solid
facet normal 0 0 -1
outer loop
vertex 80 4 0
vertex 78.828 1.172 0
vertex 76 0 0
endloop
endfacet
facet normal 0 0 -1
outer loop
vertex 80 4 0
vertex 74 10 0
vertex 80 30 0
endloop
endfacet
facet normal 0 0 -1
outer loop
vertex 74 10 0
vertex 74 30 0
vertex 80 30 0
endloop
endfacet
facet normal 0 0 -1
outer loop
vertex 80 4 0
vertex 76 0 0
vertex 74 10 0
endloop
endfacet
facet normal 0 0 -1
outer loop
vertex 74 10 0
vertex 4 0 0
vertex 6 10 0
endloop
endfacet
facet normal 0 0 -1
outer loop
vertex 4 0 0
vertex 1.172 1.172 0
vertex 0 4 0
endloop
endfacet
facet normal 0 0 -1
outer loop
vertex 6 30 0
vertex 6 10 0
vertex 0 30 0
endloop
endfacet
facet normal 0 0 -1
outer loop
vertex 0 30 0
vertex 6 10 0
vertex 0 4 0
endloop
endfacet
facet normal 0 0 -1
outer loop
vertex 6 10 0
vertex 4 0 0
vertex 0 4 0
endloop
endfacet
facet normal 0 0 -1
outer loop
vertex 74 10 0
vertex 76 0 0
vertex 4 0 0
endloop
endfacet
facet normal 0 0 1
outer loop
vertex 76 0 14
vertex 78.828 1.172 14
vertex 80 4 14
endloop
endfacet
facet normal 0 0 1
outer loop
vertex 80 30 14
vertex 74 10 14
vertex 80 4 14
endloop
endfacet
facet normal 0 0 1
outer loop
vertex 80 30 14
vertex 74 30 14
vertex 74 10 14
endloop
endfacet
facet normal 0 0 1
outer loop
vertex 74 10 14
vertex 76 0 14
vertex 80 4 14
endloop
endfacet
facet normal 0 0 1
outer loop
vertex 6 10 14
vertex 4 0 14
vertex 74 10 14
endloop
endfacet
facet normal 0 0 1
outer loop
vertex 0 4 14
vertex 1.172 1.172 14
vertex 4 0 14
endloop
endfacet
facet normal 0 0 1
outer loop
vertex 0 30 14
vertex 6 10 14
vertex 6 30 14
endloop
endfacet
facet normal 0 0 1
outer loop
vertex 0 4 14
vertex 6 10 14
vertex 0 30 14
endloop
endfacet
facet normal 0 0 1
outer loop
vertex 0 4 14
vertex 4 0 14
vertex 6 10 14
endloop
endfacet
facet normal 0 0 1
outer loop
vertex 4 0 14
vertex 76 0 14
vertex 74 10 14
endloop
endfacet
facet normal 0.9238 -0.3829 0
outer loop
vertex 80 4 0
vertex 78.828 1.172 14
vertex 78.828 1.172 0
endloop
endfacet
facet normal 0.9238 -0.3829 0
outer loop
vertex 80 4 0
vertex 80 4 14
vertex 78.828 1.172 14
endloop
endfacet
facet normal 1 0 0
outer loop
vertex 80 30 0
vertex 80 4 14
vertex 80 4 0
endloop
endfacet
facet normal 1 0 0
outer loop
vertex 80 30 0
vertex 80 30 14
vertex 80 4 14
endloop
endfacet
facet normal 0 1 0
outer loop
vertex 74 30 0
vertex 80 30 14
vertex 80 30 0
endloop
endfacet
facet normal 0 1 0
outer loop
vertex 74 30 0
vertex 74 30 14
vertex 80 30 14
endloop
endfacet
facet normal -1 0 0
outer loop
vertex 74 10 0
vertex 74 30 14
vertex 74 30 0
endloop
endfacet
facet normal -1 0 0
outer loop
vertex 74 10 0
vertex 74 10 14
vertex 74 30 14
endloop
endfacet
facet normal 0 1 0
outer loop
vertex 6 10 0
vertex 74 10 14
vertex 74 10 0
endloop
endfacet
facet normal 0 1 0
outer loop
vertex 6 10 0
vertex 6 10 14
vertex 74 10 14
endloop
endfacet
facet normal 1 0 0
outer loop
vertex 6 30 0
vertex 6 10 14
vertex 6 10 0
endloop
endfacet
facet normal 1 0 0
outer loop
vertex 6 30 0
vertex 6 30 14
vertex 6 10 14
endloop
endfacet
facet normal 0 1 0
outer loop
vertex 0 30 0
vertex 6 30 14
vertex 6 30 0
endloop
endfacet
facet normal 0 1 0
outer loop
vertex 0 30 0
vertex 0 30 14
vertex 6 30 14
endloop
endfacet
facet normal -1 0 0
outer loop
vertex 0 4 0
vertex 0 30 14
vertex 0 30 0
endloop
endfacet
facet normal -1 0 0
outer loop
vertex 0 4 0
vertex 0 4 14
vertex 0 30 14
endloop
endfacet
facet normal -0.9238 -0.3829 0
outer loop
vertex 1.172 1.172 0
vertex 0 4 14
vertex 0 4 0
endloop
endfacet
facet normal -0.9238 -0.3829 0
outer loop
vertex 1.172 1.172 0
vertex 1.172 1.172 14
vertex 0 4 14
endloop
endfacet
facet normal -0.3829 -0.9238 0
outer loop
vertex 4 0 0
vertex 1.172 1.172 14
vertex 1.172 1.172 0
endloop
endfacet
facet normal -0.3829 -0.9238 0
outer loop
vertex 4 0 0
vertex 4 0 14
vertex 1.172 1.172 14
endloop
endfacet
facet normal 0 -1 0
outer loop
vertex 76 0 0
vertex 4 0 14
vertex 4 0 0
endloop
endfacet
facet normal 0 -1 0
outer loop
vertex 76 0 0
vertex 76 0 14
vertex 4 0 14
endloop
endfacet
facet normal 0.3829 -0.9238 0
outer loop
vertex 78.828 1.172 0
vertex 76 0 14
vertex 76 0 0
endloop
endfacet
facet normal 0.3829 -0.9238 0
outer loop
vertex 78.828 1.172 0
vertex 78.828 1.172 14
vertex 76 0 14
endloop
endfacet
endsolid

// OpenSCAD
$fn = 32;

// ----------------------------------------------------------------------
// Heat sink frame: 80 x 30 mm frame, 6 mm walls
// ----------------------------------------------------------------------

// --- parameters (mm) ---
profile_height = 14;      // extrusion height
profile_points = 12;      // points of the closed outline

profile = [[0, 4], [1.172, 1.172], [4, 0], [76, 0], [78.828, 1.172], [80, 4], [80, 30], [74, 30], [74, 10], [6, 10], [6, 30], [0, 30]];  // single closed polygon, 12 points, counter clockwise

// --- the one profile operation ---
linear_extrude(height = profile_height) polygon(points = profile);
